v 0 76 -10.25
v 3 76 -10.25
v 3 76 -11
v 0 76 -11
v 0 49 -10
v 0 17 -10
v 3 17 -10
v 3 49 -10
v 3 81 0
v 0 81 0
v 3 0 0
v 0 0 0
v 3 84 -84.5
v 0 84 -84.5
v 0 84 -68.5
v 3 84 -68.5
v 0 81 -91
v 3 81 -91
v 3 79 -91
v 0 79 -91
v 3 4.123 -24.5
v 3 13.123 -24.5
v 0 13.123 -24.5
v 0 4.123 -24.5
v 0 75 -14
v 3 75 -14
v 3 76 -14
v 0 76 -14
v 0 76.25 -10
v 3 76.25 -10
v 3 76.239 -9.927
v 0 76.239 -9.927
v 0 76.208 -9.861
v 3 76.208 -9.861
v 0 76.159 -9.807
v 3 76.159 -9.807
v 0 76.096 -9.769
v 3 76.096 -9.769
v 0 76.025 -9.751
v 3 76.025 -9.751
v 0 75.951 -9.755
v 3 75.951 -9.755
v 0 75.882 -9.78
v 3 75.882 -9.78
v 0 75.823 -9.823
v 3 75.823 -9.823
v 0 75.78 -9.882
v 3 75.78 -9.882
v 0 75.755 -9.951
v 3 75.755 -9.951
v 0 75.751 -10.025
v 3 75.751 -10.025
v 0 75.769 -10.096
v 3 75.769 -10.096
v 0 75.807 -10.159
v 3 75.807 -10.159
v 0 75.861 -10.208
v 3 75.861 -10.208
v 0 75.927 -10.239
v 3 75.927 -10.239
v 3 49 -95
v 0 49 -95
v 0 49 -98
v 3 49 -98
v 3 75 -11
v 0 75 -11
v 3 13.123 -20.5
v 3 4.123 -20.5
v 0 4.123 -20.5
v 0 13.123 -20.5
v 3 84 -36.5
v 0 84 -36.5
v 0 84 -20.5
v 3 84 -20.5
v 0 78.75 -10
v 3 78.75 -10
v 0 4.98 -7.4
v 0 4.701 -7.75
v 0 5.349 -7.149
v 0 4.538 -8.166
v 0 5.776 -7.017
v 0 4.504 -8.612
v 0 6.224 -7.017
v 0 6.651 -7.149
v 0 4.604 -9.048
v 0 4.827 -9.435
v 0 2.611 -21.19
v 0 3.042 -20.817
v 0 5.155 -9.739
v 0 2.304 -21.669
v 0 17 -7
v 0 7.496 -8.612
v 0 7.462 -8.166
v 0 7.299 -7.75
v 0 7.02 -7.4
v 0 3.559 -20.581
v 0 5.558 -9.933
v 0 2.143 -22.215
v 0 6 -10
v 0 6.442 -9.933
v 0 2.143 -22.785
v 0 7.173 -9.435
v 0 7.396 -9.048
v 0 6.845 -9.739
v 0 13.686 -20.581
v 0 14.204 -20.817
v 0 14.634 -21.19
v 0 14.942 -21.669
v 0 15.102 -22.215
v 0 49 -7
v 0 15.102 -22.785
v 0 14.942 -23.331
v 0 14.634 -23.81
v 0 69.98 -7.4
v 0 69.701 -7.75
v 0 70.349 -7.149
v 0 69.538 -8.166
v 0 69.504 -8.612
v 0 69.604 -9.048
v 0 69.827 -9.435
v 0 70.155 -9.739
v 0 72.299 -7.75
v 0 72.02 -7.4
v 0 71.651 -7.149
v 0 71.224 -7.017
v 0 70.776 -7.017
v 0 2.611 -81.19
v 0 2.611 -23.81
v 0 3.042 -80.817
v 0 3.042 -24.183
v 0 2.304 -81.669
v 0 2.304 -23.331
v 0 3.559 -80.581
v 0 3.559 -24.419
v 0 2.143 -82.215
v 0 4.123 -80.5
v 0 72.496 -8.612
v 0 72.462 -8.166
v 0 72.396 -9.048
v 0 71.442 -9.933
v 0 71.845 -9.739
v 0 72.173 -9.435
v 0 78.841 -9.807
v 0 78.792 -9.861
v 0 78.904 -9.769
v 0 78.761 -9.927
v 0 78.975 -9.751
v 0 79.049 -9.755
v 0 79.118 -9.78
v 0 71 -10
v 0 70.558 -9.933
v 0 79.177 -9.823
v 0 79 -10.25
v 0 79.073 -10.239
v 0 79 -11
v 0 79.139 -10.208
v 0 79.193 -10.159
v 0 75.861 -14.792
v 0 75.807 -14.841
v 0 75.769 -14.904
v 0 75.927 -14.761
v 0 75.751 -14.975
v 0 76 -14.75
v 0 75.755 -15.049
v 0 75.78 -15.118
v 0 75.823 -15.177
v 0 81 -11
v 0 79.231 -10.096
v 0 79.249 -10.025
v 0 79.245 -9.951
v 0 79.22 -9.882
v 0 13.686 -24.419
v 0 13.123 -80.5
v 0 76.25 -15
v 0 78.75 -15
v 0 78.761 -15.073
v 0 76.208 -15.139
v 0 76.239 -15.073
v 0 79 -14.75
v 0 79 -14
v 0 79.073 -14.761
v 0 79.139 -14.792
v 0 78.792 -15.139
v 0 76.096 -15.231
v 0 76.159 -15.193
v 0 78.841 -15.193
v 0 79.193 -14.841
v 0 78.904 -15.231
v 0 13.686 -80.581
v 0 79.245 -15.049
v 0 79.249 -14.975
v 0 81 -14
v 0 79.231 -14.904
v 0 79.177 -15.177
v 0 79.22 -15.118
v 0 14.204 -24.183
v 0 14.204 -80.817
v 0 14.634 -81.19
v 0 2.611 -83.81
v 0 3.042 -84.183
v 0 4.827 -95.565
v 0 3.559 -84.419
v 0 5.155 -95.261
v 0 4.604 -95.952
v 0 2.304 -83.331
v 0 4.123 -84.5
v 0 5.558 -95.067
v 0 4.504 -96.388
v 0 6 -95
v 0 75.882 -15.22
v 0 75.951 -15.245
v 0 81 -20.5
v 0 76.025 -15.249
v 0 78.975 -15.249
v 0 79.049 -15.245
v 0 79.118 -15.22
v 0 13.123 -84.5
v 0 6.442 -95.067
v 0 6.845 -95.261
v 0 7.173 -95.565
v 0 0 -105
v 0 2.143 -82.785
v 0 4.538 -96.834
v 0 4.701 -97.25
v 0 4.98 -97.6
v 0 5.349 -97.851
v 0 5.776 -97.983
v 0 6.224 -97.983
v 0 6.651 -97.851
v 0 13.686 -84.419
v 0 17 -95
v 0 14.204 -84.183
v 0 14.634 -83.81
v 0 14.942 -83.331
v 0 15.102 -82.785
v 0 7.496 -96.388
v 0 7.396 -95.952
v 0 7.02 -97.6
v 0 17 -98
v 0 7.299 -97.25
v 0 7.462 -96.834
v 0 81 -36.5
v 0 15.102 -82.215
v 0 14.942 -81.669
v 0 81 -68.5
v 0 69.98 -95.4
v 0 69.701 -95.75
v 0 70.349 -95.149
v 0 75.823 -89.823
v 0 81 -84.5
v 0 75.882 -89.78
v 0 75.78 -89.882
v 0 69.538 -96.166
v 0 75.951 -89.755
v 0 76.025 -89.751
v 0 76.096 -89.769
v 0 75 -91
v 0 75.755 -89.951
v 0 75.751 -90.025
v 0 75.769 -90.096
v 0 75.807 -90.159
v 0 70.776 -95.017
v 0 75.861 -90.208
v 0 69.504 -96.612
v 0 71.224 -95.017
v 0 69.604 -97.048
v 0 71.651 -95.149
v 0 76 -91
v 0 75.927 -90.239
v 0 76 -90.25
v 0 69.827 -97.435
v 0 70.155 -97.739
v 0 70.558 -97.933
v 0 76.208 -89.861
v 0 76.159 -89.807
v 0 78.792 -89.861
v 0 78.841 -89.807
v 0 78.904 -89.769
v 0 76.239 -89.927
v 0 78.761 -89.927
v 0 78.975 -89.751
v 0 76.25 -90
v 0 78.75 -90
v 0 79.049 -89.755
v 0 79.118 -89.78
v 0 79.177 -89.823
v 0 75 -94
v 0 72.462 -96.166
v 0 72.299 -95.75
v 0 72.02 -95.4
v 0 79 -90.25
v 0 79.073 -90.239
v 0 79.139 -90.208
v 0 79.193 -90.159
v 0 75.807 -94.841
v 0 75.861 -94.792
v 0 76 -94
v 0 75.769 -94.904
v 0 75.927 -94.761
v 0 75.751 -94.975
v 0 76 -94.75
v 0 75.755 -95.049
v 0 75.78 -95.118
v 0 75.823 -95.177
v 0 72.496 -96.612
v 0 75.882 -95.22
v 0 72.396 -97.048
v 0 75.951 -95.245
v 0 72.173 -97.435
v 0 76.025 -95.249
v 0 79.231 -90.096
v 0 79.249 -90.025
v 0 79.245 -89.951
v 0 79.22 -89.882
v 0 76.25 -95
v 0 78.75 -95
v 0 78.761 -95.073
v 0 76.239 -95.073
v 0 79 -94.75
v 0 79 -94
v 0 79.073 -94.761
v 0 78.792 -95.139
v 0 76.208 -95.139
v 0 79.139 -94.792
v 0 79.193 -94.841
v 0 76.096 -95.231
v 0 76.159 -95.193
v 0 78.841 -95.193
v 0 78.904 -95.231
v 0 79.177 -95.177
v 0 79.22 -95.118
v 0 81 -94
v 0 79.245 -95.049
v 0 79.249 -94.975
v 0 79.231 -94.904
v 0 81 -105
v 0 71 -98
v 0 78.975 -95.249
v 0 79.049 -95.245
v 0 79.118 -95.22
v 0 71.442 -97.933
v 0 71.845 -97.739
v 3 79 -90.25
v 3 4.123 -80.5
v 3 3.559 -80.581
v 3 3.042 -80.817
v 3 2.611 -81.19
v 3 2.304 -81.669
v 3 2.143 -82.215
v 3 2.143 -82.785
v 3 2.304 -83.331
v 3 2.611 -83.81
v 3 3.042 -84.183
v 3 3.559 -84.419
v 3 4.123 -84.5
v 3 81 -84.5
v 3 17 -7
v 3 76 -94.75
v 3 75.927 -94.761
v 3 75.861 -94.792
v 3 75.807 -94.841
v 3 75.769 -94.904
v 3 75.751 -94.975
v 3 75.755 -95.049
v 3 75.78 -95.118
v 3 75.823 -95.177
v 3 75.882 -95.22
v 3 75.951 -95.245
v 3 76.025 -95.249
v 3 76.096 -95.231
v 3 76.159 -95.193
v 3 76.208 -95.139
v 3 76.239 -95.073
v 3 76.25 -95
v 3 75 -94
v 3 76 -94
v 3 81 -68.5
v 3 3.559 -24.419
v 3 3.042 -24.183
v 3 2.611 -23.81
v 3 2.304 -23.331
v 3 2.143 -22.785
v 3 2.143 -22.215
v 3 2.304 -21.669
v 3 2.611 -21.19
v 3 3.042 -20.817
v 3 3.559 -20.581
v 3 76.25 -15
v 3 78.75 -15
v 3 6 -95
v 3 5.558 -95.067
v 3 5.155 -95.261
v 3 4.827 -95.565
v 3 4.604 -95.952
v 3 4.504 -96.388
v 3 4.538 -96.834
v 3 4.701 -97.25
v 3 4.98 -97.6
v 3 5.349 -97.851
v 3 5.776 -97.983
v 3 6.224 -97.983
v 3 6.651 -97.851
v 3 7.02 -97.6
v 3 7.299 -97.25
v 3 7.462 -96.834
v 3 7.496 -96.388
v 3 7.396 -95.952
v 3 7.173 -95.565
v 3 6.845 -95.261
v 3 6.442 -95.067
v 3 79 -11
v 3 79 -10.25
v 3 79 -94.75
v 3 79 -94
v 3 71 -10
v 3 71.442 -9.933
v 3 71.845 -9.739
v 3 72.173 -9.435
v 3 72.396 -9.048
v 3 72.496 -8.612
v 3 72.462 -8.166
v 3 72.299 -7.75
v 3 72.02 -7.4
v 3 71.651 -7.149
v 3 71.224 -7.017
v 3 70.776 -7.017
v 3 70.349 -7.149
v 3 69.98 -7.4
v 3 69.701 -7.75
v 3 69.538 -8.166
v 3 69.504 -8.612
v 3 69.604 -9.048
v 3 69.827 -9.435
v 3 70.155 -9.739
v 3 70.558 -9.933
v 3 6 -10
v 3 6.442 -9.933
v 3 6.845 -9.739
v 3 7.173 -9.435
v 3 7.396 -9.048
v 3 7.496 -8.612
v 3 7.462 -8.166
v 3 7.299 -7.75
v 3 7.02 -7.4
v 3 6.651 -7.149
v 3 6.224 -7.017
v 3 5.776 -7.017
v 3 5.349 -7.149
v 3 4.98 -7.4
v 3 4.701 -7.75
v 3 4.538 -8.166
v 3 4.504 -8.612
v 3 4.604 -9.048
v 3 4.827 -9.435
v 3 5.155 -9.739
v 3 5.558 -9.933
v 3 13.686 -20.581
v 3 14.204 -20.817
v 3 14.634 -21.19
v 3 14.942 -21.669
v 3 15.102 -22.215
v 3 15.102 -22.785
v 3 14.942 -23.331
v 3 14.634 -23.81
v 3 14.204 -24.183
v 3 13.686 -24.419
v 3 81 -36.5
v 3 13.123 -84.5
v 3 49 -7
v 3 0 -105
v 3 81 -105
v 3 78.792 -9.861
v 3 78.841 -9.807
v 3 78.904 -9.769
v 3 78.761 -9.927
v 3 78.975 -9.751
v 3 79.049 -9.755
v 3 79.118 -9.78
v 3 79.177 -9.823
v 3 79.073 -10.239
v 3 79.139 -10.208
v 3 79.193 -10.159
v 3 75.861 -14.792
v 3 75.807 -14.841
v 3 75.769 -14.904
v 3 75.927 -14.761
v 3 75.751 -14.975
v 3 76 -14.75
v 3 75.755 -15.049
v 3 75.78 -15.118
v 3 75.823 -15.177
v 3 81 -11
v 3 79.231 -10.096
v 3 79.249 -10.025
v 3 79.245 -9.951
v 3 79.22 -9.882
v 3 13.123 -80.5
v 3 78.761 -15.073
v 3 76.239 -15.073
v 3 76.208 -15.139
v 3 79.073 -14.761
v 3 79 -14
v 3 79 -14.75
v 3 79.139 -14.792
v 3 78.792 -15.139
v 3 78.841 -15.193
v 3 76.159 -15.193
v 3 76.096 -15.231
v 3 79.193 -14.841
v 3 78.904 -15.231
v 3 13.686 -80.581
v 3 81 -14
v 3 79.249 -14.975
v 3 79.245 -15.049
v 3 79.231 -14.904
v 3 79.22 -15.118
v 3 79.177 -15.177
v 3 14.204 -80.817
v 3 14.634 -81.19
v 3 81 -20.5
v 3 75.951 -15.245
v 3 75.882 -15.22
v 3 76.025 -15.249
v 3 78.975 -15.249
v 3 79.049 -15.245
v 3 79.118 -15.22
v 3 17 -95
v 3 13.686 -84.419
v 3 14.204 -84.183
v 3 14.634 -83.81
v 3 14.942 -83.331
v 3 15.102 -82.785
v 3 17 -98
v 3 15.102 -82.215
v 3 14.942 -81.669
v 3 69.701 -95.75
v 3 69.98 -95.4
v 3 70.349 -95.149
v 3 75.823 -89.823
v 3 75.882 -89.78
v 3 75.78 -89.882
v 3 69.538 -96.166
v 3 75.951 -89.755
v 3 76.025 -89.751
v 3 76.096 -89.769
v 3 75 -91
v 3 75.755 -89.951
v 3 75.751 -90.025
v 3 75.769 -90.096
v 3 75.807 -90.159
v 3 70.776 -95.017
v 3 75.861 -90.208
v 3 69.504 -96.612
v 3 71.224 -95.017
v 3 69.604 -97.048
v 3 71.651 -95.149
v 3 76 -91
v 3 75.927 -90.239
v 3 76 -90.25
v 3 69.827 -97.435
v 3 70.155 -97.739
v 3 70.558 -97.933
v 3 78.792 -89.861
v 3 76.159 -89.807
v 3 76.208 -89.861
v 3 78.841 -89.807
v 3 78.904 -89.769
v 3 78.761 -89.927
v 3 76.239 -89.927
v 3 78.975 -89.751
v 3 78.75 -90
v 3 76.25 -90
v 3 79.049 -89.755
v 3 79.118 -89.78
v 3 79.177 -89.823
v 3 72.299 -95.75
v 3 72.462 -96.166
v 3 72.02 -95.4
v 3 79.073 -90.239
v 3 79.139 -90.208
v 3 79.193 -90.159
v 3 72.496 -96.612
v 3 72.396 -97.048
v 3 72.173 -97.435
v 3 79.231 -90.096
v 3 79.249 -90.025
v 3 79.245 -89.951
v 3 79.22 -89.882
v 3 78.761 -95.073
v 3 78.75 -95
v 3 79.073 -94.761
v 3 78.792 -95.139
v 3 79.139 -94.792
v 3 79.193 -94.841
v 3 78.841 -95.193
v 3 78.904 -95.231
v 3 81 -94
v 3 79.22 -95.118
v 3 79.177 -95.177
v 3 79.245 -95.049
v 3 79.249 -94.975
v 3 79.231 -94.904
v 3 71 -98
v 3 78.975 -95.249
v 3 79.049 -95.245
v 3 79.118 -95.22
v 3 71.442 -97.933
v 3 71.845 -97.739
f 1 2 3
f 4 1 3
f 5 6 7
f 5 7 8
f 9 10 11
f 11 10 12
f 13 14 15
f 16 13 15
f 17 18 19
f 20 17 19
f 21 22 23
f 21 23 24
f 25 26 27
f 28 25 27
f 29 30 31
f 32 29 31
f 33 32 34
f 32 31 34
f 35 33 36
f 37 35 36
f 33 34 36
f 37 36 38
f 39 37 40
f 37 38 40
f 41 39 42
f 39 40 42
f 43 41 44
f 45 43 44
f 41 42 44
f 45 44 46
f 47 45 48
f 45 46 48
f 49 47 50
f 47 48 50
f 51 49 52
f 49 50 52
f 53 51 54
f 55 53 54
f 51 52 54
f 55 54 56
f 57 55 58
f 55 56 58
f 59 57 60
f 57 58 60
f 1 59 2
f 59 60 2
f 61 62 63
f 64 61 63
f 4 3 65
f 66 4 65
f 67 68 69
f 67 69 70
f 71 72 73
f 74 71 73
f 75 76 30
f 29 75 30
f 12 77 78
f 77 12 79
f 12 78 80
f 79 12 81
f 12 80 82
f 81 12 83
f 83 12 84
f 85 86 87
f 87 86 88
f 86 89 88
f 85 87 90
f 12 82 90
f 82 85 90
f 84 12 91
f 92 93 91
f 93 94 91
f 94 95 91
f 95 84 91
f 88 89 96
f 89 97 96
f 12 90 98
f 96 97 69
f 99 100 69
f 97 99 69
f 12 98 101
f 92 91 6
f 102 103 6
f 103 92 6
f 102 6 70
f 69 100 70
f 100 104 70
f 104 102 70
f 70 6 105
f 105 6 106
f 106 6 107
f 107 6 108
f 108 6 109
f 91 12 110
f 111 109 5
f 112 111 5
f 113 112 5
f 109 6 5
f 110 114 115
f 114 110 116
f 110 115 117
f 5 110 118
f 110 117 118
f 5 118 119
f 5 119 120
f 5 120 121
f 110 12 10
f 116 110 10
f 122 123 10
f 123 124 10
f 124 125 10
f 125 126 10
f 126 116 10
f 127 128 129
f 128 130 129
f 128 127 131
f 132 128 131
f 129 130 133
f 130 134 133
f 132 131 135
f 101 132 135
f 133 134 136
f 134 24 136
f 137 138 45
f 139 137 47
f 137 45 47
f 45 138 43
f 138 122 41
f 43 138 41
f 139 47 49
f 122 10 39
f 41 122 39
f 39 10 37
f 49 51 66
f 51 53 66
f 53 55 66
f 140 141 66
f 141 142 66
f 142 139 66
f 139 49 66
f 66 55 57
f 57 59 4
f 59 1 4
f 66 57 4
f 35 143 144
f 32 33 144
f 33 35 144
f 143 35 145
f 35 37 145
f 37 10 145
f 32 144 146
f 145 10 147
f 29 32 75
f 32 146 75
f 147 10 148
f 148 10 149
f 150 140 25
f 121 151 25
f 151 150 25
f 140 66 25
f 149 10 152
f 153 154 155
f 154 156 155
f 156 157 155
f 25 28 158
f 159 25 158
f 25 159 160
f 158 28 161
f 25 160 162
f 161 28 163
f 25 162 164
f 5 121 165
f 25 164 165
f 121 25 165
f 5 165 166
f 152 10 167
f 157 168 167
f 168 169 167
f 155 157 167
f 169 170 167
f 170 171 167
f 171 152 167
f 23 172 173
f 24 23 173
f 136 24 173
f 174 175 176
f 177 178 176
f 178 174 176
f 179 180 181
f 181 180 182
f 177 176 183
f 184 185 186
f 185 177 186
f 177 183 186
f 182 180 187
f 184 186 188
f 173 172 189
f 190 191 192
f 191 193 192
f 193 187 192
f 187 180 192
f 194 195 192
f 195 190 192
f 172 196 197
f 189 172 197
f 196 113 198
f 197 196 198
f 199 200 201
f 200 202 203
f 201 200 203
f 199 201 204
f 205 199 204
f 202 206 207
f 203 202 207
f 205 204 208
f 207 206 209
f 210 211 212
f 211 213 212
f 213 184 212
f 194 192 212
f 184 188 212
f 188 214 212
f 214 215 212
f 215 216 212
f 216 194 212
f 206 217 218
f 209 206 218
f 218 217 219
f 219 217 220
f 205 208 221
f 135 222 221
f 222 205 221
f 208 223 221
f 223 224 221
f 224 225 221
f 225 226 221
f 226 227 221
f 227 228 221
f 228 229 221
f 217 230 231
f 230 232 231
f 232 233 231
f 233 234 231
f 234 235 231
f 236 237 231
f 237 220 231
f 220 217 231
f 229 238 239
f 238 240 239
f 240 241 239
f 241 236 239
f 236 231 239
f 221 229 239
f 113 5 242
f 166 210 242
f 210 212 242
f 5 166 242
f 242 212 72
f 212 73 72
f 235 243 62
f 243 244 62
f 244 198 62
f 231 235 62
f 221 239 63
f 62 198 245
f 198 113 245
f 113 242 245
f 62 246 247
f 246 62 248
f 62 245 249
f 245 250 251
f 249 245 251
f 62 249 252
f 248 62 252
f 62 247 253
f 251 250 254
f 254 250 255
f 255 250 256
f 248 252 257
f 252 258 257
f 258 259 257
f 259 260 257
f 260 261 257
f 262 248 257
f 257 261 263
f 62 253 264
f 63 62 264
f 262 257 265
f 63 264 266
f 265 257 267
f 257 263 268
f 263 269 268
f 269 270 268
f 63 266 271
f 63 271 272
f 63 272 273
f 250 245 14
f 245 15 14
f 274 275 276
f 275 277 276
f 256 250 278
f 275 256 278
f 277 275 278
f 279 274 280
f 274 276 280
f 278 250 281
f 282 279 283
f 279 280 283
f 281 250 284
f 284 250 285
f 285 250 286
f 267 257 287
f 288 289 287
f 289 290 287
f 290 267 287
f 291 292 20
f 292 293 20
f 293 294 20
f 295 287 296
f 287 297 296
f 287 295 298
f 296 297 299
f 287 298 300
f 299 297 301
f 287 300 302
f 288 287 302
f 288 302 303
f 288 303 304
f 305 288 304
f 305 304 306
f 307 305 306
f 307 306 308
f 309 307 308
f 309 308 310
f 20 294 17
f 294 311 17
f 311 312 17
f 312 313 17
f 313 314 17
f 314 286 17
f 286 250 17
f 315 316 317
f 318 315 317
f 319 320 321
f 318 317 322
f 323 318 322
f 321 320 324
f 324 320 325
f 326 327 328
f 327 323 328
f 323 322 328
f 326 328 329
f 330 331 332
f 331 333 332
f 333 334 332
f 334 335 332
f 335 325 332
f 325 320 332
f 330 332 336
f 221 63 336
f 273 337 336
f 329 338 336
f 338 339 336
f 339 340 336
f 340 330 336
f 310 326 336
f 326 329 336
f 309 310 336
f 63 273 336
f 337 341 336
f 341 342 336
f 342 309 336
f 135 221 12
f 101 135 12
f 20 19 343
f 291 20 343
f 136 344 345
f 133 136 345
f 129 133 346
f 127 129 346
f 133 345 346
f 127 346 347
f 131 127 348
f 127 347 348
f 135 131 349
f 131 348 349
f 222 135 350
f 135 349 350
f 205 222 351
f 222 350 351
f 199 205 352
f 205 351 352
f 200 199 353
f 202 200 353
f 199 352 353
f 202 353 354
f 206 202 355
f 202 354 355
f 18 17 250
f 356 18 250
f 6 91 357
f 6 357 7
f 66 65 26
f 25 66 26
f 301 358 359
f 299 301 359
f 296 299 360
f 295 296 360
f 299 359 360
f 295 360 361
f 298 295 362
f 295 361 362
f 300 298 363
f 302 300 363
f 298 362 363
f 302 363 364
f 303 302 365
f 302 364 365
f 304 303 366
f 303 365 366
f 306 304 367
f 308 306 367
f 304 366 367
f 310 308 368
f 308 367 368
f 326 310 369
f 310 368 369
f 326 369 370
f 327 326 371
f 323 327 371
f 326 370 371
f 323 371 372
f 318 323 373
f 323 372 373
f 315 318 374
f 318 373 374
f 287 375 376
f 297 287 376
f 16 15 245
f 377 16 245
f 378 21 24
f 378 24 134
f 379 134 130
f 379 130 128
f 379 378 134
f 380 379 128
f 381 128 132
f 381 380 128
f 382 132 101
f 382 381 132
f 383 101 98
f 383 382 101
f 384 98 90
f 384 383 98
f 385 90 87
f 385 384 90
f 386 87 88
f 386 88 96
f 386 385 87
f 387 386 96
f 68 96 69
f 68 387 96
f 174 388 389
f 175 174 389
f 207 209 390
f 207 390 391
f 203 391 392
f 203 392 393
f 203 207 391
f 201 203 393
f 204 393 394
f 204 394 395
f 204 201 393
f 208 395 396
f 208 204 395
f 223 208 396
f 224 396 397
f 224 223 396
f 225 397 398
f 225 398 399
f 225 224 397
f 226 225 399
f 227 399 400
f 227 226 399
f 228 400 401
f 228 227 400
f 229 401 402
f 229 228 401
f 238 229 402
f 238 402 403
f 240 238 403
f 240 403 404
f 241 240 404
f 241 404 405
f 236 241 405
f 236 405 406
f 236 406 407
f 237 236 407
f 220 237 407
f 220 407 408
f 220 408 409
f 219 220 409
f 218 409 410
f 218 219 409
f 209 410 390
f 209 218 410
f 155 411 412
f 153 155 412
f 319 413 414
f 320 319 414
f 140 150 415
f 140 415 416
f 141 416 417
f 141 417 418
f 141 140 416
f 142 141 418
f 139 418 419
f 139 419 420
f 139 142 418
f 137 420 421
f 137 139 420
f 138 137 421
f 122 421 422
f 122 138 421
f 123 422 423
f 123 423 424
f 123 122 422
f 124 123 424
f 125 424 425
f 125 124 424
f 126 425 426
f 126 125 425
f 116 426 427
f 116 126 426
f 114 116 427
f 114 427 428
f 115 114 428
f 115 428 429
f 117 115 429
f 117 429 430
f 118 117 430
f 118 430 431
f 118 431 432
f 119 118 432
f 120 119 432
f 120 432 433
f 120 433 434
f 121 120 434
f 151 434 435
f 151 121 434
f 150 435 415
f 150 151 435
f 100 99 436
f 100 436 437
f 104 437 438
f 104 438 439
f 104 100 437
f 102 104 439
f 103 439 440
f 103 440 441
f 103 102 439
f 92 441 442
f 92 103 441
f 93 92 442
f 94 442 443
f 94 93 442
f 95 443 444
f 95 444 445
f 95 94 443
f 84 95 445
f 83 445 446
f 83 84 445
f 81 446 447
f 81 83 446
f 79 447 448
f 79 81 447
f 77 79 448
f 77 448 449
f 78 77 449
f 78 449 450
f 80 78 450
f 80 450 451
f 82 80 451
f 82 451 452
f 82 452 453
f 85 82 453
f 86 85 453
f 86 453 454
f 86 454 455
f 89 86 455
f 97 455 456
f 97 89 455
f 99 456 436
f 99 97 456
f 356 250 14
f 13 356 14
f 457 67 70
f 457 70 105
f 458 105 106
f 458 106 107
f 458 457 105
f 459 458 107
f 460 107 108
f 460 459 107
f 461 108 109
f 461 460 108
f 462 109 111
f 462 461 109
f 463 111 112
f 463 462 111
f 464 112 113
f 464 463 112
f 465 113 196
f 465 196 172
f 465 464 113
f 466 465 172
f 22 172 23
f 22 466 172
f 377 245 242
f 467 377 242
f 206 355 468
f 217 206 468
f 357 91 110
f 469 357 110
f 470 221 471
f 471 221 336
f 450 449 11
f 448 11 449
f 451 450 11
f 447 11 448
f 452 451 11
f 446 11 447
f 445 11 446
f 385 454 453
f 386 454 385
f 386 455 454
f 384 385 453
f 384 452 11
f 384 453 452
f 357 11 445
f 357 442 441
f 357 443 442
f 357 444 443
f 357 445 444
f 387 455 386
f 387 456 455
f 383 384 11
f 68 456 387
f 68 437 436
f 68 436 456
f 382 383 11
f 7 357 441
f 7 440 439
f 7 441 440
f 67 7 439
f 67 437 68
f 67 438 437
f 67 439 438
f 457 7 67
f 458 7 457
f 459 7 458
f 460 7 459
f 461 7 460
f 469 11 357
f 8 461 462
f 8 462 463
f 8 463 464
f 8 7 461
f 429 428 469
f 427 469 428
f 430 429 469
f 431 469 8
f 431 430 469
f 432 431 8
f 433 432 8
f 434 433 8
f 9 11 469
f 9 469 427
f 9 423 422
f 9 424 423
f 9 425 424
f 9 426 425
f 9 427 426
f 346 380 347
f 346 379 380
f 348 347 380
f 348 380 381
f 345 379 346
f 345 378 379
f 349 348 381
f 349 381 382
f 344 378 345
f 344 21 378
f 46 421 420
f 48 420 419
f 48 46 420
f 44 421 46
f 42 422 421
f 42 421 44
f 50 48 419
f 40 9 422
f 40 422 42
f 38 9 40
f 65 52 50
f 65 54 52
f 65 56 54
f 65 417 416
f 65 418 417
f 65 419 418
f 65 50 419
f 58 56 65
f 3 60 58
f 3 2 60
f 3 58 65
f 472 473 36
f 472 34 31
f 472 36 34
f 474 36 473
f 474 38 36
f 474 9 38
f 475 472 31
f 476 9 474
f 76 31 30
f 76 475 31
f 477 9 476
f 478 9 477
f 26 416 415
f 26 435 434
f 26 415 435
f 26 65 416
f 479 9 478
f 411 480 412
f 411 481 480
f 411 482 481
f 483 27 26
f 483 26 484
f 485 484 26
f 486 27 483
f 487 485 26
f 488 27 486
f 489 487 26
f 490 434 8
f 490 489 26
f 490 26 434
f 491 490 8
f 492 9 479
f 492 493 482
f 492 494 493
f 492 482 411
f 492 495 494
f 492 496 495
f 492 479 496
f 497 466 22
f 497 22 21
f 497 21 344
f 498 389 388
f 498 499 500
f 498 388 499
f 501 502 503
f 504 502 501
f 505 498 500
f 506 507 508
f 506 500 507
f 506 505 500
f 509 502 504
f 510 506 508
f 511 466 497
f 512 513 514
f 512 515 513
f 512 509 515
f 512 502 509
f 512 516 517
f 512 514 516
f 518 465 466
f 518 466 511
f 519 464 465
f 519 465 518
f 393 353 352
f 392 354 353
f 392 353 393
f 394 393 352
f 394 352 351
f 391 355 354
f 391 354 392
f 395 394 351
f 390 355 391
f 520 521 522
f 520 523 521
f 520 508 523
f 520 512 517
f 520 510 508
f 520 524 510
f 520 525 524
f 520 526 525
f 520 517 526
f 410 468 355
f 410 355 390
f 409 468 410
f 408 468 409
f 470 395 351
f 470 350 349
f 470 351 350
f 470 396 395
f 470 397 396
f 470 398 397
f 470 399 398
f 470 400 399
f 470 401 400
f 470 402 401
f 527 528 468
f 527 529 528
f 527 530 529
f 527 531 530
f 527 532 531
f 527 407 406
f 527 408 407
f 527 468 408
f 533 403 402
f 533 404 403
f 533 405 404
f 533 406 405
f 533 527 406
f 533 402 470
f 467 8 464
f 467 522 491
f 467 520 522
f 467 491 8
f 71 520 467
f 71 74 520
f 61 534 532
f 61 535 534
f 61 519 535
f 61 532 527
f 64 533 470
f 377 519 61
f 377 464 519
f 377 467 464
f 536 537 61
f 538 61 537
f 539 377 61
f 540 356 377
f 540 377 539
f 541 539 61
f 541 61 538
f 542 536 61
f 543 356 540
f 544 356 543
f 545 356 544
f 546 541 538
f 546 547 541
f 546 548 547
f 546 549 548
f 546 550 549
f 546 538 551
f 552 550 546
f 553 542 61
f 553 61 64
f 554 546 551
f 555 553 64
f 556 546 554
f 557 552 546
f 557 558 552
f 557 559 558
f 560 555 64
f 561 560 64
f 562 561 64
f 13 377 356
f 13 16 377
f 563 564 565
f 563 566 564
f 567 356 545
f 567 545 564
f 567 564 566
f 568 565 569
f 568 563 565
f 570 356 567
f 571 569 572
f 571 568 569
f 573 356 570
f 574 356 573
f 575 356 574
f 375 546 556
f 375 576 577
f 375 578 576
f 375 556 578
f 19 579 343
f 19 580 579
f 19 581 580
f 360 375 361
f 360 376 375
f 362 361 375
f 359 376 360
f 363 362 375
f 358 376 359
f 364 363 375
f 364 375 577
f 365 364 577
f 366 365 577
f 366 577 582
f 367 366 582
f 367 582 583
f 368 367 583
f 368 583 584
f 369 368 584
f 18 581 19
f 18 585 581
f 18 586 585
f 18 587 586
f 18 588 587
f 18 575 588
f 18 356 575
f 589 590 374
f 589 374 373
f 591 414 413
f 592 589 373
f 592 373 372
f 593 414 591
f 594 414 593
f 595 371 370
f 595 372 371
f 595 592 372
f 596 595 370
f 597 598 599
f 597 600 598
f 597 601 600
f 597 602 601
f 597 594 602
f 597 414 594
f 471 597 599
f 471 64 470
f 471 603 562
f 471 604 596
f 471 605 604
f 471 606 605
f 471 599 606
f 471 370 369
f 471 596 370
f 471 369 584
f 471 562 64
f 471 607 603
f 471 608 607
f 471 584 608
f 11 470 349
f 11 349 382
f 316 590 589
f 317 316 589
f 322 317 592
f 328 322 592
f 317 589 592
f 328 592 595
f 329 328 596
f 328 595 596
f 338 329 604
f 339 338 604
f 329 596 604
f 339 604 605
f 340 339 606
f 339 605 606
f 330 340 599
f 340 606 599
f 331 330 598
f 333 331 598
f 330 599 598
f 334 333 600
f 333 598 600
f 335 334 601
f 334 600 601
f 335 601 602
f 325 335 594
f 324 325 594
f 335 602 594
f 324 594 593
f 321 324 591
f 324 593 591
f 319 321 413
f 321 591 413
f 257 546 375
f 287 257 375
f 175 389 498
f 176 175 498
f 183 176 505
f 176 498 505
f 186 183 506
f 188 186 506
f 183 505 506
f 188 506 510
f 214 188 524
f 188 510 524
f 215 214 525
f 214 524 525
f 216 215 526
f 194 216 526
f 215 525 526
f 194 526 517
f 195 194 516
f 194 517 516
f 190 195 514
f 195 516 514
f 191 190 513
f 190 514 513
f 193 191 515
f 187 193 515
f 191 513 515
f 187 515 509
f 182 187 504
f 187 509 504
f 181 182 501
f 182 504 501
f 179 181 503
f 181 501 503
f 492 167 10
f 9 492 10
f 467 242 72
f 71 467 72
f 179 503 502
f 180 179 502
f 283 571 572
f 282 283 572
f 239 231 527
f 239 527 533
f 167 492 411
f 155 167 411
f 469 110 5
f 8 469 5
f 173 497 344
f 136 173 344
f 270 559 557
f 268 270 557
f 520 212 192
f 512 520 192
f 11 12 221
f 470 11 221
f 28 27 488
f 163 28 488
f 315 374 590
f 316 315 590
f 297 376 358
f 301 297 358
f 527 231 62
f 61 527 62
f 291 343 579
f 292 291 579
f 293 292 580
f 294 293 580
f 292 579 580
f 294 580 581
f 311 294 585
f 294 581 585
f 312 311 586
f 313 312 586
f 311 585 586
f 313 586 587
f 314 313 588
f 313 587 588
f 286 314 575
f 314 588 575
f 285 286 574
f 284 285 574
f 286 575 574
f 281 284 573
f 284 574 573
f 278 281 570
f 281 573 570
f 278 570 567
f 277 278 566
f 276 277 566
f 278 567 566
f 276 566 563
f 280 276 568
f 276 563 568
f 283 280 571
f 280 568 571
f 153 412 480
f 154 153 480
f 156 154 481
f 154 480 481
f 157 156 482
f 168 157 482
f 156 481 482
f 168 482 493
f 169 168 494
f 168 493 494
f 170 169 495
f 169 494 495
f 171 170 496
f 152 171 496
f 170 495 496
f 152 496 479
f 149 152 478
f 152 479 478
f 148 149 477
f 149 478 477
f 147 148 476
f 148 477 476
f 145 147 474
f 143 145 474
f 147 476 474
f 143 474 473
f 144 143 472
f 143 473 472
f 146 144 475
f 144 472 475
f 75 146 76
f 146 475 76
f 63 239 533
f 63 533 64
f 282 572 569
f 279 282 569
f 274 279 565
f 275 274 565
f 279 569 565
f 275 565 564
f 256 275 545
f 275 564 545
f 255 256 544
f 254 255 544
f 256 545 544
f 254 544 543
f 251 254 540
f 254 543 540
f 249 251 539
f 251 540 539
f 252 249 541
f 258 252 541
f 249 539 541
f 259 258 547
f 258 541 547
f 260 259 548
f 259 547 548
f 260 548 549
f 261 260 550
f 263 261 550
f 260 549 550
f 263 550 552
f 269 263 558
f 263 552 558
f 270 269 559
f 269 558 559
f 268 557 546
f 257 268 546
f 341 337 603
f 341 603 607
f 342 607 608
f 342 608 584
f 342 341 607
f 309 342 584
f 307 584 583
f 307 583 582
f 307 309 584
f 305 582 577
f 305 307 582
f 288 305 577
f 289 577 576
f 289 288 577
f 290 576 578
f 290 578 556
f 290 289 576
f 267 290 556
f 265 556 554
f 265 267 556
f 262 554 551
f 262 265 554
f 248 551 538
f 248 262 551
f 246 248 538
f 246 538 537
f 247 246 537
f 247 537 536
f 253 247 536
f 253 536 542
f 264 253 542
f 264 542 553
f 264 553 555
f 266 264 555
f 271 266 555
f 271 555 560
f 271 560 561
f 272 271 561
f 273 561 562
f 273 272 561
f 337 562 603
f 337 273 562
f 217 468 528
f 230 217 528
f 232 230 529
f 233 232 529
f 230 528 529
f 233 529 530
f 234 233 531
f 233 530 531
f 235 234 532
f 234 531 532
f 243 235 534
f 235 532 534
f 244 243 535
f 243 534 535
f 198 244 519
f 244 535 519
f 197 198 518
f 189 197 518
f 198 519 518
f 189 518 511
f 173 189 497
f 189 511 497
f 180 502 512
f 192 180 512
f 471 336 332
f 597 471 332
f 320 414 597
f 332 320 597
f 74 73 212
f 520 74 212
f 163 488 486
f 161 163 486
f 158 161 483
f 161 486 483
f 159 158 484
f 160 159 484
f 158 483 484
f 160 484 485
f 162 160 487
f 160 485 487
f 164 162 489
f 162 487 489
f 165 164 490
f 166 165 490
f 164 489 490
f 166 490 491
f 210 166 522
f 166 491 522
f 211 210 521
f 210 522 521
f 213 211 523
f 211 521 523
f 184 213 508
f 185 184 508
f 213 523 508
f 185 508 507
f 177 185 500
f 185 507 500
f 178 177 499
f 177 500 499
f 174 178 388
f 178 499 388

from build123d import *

# Parameters (mm, degrees)
CROQUIS1_R              = 1.5
CROQUIS1_W              = 3
CROQUIS1_H              = 32
SALIENTE_EXTRUIR1_DEPTH = 3
CORTAR_EXTRUIR1_DEPTH   = 3
CORTAR_EXTRUIR2_DEPTH   = 3


with BuildPart() as part:
    # Croquis1 → Saliente-Extruir1 (new body)
    with BuildSketch(Plane(origin=(0, 0, 0), x_dir=(0, 0, -1), z_dir=(1, 0, 0))):
        Polygon((0, 0), (105, 0), (105, 81), (84.5, 81), (84.5, 84), (68.5, 84), (68.5, 81), (36.5, 81), (36.5, 84), (20.5, 84), (20.5, 81), (0, 81), align=None)
        with Locations((8.5, 71)):
            Circle(CROQUIS1_R, mode=Mode.SUBTRACT)
        with Locations((96.5, 71)):
            Circle(CROQUIS1_R, mode=Mode.SUBTRACT)
        with Locations((8.5, 6)):
            Circle(CROQUIS1_R, mode=Mode.SUBTRACT)
        with Locations(Location((96.5, 6, 0), (0, 0, 180))):
            Circle(CROQUIS1_R, mode=Mode.SUBTRACT)
        with Locations((8.5, 33)):
            Rectangle(CROQUIS1_W, CROQUIS1_H, mode=Mode.SUBTRACT)
        with Locations((96.5, 33)):
            Rectangle(CROQUIS1_W, CROQUIS1_H, mode=Mode.SUBTRACT)
    extrude(amount=SALIENTE_EXTRUIR1_DEPTH)

    # Croquis2 → Cortar-Extruir1 (cut)
    with BuildSketch(Plane(origin=(3, 0, 0), x_dir=(0, 0, -1), z_dir=(1, 0, 0))):
        with BuildLine():
            Line((14, 79), (14, 81))
            Line((14, 81), (11, 81))
            Line((11, 81), (11, 79))
            Line((11, 79), (10.25, 79))
            ThreePointArc((10.25, 79), (9.823223305, 79.176776695), (10, 78.75))
            Line((10, 78.75), (10, 76.25))
            ThreePointArc((10, 76.25), (9.823223305, 75.823223305), (10.25, 76))
            Line((10.25, 76), (11, 76))
            Line((11, 76), (11, 75))
            Line((11, 75), (14, 75))
            Line((14, 75), (14, 76))
            Line((14, 76), (14.75, 76))
            ThreePointArc((14.75, 76), (15.176776695, 75.823223305), (15, 76.25))
            Line((15, 76.25), (15, 78.75))
            ThreePointArc((15, 78.75), (15.176776695, 79.176776695), (14.75, 79))
            Line((14.75, 79), (14, 79))
        make_face()
        with BuildLine():
            Line((94, 79), (94, 81))
            Line((94, 81), (91, 81))
            Line((91, 81), (91, 79))
            Line((91, 79), (90.25, 79))
            ThreePointArc((90.25, 79), (89.823223305, 79.176776695), (90, 78.75))
            Line((90, 78.75), (90, 76.25))
            ThreePointArc((90, 76.25), (89.823223305, 75.823223305), (90.25, 76))
            Line((90.25, 76), (91, 76))
            Line((91, 76), (91, 75))
            Line((91, 75), (94, 75))
            Line((94, 75), (94, 76))
            Line((94, 76), (94.75, 76))
            ThreePointArc((94.75, 76), (95.176776695, 75.823223305), (95, 76.25))
            Line((95, 76.25), (95, 78.75))
            ThreePointArc((95, 78.75), (95.176776695, 79.176776695), (94.75, 79))
            Line((94.75, 79), (94, 79))
        make_face()
    extrude(amount=-CORTAR_EXTRUIR1_DEPTH, mode=Mode.SUBTRACT)

    # Croquis3 → Cortar-Extruir2 (cut)
    with BuildSketch(Plane(origin=(3, 0, 0), x_dir=(0, 0, -1), z_dir=(1, 0, 0))):
        with BuildLine():
            Line((20.5, 4.122846639), (20.5, 13.122846639))
            ThreePointArc((20.5, 13.122846639), (22.5, 15.122846639), (24.5, 13.122846639))
            Line((24.5, 13.122846639), (24.5, 4.122846639))
            ThreePointArc((24.5, 4.122846639), (22.5, 2.122846639), (20.5, 4.122846639))
        make_face()
        with BuildLine():
            Line((84.5, 4.122846639), (84.5, 13.122846639))
            ThreePointArc((84.5, 13.122846639), (82.5, 15.122846639), (80.5, 13.122846639))
            Line((80.5, 13.122846639), (80.5, 4.122846639))
            ThreePointArc((80.5, 4.122846639), (82.5, 2.122846639), (84.5, 4.122846639))
        make_face()
    extrude(amount=-CORTAR_EXTRUIR2_DEPTH, mode=Mode.SUBTRACT)


solid = part.part
